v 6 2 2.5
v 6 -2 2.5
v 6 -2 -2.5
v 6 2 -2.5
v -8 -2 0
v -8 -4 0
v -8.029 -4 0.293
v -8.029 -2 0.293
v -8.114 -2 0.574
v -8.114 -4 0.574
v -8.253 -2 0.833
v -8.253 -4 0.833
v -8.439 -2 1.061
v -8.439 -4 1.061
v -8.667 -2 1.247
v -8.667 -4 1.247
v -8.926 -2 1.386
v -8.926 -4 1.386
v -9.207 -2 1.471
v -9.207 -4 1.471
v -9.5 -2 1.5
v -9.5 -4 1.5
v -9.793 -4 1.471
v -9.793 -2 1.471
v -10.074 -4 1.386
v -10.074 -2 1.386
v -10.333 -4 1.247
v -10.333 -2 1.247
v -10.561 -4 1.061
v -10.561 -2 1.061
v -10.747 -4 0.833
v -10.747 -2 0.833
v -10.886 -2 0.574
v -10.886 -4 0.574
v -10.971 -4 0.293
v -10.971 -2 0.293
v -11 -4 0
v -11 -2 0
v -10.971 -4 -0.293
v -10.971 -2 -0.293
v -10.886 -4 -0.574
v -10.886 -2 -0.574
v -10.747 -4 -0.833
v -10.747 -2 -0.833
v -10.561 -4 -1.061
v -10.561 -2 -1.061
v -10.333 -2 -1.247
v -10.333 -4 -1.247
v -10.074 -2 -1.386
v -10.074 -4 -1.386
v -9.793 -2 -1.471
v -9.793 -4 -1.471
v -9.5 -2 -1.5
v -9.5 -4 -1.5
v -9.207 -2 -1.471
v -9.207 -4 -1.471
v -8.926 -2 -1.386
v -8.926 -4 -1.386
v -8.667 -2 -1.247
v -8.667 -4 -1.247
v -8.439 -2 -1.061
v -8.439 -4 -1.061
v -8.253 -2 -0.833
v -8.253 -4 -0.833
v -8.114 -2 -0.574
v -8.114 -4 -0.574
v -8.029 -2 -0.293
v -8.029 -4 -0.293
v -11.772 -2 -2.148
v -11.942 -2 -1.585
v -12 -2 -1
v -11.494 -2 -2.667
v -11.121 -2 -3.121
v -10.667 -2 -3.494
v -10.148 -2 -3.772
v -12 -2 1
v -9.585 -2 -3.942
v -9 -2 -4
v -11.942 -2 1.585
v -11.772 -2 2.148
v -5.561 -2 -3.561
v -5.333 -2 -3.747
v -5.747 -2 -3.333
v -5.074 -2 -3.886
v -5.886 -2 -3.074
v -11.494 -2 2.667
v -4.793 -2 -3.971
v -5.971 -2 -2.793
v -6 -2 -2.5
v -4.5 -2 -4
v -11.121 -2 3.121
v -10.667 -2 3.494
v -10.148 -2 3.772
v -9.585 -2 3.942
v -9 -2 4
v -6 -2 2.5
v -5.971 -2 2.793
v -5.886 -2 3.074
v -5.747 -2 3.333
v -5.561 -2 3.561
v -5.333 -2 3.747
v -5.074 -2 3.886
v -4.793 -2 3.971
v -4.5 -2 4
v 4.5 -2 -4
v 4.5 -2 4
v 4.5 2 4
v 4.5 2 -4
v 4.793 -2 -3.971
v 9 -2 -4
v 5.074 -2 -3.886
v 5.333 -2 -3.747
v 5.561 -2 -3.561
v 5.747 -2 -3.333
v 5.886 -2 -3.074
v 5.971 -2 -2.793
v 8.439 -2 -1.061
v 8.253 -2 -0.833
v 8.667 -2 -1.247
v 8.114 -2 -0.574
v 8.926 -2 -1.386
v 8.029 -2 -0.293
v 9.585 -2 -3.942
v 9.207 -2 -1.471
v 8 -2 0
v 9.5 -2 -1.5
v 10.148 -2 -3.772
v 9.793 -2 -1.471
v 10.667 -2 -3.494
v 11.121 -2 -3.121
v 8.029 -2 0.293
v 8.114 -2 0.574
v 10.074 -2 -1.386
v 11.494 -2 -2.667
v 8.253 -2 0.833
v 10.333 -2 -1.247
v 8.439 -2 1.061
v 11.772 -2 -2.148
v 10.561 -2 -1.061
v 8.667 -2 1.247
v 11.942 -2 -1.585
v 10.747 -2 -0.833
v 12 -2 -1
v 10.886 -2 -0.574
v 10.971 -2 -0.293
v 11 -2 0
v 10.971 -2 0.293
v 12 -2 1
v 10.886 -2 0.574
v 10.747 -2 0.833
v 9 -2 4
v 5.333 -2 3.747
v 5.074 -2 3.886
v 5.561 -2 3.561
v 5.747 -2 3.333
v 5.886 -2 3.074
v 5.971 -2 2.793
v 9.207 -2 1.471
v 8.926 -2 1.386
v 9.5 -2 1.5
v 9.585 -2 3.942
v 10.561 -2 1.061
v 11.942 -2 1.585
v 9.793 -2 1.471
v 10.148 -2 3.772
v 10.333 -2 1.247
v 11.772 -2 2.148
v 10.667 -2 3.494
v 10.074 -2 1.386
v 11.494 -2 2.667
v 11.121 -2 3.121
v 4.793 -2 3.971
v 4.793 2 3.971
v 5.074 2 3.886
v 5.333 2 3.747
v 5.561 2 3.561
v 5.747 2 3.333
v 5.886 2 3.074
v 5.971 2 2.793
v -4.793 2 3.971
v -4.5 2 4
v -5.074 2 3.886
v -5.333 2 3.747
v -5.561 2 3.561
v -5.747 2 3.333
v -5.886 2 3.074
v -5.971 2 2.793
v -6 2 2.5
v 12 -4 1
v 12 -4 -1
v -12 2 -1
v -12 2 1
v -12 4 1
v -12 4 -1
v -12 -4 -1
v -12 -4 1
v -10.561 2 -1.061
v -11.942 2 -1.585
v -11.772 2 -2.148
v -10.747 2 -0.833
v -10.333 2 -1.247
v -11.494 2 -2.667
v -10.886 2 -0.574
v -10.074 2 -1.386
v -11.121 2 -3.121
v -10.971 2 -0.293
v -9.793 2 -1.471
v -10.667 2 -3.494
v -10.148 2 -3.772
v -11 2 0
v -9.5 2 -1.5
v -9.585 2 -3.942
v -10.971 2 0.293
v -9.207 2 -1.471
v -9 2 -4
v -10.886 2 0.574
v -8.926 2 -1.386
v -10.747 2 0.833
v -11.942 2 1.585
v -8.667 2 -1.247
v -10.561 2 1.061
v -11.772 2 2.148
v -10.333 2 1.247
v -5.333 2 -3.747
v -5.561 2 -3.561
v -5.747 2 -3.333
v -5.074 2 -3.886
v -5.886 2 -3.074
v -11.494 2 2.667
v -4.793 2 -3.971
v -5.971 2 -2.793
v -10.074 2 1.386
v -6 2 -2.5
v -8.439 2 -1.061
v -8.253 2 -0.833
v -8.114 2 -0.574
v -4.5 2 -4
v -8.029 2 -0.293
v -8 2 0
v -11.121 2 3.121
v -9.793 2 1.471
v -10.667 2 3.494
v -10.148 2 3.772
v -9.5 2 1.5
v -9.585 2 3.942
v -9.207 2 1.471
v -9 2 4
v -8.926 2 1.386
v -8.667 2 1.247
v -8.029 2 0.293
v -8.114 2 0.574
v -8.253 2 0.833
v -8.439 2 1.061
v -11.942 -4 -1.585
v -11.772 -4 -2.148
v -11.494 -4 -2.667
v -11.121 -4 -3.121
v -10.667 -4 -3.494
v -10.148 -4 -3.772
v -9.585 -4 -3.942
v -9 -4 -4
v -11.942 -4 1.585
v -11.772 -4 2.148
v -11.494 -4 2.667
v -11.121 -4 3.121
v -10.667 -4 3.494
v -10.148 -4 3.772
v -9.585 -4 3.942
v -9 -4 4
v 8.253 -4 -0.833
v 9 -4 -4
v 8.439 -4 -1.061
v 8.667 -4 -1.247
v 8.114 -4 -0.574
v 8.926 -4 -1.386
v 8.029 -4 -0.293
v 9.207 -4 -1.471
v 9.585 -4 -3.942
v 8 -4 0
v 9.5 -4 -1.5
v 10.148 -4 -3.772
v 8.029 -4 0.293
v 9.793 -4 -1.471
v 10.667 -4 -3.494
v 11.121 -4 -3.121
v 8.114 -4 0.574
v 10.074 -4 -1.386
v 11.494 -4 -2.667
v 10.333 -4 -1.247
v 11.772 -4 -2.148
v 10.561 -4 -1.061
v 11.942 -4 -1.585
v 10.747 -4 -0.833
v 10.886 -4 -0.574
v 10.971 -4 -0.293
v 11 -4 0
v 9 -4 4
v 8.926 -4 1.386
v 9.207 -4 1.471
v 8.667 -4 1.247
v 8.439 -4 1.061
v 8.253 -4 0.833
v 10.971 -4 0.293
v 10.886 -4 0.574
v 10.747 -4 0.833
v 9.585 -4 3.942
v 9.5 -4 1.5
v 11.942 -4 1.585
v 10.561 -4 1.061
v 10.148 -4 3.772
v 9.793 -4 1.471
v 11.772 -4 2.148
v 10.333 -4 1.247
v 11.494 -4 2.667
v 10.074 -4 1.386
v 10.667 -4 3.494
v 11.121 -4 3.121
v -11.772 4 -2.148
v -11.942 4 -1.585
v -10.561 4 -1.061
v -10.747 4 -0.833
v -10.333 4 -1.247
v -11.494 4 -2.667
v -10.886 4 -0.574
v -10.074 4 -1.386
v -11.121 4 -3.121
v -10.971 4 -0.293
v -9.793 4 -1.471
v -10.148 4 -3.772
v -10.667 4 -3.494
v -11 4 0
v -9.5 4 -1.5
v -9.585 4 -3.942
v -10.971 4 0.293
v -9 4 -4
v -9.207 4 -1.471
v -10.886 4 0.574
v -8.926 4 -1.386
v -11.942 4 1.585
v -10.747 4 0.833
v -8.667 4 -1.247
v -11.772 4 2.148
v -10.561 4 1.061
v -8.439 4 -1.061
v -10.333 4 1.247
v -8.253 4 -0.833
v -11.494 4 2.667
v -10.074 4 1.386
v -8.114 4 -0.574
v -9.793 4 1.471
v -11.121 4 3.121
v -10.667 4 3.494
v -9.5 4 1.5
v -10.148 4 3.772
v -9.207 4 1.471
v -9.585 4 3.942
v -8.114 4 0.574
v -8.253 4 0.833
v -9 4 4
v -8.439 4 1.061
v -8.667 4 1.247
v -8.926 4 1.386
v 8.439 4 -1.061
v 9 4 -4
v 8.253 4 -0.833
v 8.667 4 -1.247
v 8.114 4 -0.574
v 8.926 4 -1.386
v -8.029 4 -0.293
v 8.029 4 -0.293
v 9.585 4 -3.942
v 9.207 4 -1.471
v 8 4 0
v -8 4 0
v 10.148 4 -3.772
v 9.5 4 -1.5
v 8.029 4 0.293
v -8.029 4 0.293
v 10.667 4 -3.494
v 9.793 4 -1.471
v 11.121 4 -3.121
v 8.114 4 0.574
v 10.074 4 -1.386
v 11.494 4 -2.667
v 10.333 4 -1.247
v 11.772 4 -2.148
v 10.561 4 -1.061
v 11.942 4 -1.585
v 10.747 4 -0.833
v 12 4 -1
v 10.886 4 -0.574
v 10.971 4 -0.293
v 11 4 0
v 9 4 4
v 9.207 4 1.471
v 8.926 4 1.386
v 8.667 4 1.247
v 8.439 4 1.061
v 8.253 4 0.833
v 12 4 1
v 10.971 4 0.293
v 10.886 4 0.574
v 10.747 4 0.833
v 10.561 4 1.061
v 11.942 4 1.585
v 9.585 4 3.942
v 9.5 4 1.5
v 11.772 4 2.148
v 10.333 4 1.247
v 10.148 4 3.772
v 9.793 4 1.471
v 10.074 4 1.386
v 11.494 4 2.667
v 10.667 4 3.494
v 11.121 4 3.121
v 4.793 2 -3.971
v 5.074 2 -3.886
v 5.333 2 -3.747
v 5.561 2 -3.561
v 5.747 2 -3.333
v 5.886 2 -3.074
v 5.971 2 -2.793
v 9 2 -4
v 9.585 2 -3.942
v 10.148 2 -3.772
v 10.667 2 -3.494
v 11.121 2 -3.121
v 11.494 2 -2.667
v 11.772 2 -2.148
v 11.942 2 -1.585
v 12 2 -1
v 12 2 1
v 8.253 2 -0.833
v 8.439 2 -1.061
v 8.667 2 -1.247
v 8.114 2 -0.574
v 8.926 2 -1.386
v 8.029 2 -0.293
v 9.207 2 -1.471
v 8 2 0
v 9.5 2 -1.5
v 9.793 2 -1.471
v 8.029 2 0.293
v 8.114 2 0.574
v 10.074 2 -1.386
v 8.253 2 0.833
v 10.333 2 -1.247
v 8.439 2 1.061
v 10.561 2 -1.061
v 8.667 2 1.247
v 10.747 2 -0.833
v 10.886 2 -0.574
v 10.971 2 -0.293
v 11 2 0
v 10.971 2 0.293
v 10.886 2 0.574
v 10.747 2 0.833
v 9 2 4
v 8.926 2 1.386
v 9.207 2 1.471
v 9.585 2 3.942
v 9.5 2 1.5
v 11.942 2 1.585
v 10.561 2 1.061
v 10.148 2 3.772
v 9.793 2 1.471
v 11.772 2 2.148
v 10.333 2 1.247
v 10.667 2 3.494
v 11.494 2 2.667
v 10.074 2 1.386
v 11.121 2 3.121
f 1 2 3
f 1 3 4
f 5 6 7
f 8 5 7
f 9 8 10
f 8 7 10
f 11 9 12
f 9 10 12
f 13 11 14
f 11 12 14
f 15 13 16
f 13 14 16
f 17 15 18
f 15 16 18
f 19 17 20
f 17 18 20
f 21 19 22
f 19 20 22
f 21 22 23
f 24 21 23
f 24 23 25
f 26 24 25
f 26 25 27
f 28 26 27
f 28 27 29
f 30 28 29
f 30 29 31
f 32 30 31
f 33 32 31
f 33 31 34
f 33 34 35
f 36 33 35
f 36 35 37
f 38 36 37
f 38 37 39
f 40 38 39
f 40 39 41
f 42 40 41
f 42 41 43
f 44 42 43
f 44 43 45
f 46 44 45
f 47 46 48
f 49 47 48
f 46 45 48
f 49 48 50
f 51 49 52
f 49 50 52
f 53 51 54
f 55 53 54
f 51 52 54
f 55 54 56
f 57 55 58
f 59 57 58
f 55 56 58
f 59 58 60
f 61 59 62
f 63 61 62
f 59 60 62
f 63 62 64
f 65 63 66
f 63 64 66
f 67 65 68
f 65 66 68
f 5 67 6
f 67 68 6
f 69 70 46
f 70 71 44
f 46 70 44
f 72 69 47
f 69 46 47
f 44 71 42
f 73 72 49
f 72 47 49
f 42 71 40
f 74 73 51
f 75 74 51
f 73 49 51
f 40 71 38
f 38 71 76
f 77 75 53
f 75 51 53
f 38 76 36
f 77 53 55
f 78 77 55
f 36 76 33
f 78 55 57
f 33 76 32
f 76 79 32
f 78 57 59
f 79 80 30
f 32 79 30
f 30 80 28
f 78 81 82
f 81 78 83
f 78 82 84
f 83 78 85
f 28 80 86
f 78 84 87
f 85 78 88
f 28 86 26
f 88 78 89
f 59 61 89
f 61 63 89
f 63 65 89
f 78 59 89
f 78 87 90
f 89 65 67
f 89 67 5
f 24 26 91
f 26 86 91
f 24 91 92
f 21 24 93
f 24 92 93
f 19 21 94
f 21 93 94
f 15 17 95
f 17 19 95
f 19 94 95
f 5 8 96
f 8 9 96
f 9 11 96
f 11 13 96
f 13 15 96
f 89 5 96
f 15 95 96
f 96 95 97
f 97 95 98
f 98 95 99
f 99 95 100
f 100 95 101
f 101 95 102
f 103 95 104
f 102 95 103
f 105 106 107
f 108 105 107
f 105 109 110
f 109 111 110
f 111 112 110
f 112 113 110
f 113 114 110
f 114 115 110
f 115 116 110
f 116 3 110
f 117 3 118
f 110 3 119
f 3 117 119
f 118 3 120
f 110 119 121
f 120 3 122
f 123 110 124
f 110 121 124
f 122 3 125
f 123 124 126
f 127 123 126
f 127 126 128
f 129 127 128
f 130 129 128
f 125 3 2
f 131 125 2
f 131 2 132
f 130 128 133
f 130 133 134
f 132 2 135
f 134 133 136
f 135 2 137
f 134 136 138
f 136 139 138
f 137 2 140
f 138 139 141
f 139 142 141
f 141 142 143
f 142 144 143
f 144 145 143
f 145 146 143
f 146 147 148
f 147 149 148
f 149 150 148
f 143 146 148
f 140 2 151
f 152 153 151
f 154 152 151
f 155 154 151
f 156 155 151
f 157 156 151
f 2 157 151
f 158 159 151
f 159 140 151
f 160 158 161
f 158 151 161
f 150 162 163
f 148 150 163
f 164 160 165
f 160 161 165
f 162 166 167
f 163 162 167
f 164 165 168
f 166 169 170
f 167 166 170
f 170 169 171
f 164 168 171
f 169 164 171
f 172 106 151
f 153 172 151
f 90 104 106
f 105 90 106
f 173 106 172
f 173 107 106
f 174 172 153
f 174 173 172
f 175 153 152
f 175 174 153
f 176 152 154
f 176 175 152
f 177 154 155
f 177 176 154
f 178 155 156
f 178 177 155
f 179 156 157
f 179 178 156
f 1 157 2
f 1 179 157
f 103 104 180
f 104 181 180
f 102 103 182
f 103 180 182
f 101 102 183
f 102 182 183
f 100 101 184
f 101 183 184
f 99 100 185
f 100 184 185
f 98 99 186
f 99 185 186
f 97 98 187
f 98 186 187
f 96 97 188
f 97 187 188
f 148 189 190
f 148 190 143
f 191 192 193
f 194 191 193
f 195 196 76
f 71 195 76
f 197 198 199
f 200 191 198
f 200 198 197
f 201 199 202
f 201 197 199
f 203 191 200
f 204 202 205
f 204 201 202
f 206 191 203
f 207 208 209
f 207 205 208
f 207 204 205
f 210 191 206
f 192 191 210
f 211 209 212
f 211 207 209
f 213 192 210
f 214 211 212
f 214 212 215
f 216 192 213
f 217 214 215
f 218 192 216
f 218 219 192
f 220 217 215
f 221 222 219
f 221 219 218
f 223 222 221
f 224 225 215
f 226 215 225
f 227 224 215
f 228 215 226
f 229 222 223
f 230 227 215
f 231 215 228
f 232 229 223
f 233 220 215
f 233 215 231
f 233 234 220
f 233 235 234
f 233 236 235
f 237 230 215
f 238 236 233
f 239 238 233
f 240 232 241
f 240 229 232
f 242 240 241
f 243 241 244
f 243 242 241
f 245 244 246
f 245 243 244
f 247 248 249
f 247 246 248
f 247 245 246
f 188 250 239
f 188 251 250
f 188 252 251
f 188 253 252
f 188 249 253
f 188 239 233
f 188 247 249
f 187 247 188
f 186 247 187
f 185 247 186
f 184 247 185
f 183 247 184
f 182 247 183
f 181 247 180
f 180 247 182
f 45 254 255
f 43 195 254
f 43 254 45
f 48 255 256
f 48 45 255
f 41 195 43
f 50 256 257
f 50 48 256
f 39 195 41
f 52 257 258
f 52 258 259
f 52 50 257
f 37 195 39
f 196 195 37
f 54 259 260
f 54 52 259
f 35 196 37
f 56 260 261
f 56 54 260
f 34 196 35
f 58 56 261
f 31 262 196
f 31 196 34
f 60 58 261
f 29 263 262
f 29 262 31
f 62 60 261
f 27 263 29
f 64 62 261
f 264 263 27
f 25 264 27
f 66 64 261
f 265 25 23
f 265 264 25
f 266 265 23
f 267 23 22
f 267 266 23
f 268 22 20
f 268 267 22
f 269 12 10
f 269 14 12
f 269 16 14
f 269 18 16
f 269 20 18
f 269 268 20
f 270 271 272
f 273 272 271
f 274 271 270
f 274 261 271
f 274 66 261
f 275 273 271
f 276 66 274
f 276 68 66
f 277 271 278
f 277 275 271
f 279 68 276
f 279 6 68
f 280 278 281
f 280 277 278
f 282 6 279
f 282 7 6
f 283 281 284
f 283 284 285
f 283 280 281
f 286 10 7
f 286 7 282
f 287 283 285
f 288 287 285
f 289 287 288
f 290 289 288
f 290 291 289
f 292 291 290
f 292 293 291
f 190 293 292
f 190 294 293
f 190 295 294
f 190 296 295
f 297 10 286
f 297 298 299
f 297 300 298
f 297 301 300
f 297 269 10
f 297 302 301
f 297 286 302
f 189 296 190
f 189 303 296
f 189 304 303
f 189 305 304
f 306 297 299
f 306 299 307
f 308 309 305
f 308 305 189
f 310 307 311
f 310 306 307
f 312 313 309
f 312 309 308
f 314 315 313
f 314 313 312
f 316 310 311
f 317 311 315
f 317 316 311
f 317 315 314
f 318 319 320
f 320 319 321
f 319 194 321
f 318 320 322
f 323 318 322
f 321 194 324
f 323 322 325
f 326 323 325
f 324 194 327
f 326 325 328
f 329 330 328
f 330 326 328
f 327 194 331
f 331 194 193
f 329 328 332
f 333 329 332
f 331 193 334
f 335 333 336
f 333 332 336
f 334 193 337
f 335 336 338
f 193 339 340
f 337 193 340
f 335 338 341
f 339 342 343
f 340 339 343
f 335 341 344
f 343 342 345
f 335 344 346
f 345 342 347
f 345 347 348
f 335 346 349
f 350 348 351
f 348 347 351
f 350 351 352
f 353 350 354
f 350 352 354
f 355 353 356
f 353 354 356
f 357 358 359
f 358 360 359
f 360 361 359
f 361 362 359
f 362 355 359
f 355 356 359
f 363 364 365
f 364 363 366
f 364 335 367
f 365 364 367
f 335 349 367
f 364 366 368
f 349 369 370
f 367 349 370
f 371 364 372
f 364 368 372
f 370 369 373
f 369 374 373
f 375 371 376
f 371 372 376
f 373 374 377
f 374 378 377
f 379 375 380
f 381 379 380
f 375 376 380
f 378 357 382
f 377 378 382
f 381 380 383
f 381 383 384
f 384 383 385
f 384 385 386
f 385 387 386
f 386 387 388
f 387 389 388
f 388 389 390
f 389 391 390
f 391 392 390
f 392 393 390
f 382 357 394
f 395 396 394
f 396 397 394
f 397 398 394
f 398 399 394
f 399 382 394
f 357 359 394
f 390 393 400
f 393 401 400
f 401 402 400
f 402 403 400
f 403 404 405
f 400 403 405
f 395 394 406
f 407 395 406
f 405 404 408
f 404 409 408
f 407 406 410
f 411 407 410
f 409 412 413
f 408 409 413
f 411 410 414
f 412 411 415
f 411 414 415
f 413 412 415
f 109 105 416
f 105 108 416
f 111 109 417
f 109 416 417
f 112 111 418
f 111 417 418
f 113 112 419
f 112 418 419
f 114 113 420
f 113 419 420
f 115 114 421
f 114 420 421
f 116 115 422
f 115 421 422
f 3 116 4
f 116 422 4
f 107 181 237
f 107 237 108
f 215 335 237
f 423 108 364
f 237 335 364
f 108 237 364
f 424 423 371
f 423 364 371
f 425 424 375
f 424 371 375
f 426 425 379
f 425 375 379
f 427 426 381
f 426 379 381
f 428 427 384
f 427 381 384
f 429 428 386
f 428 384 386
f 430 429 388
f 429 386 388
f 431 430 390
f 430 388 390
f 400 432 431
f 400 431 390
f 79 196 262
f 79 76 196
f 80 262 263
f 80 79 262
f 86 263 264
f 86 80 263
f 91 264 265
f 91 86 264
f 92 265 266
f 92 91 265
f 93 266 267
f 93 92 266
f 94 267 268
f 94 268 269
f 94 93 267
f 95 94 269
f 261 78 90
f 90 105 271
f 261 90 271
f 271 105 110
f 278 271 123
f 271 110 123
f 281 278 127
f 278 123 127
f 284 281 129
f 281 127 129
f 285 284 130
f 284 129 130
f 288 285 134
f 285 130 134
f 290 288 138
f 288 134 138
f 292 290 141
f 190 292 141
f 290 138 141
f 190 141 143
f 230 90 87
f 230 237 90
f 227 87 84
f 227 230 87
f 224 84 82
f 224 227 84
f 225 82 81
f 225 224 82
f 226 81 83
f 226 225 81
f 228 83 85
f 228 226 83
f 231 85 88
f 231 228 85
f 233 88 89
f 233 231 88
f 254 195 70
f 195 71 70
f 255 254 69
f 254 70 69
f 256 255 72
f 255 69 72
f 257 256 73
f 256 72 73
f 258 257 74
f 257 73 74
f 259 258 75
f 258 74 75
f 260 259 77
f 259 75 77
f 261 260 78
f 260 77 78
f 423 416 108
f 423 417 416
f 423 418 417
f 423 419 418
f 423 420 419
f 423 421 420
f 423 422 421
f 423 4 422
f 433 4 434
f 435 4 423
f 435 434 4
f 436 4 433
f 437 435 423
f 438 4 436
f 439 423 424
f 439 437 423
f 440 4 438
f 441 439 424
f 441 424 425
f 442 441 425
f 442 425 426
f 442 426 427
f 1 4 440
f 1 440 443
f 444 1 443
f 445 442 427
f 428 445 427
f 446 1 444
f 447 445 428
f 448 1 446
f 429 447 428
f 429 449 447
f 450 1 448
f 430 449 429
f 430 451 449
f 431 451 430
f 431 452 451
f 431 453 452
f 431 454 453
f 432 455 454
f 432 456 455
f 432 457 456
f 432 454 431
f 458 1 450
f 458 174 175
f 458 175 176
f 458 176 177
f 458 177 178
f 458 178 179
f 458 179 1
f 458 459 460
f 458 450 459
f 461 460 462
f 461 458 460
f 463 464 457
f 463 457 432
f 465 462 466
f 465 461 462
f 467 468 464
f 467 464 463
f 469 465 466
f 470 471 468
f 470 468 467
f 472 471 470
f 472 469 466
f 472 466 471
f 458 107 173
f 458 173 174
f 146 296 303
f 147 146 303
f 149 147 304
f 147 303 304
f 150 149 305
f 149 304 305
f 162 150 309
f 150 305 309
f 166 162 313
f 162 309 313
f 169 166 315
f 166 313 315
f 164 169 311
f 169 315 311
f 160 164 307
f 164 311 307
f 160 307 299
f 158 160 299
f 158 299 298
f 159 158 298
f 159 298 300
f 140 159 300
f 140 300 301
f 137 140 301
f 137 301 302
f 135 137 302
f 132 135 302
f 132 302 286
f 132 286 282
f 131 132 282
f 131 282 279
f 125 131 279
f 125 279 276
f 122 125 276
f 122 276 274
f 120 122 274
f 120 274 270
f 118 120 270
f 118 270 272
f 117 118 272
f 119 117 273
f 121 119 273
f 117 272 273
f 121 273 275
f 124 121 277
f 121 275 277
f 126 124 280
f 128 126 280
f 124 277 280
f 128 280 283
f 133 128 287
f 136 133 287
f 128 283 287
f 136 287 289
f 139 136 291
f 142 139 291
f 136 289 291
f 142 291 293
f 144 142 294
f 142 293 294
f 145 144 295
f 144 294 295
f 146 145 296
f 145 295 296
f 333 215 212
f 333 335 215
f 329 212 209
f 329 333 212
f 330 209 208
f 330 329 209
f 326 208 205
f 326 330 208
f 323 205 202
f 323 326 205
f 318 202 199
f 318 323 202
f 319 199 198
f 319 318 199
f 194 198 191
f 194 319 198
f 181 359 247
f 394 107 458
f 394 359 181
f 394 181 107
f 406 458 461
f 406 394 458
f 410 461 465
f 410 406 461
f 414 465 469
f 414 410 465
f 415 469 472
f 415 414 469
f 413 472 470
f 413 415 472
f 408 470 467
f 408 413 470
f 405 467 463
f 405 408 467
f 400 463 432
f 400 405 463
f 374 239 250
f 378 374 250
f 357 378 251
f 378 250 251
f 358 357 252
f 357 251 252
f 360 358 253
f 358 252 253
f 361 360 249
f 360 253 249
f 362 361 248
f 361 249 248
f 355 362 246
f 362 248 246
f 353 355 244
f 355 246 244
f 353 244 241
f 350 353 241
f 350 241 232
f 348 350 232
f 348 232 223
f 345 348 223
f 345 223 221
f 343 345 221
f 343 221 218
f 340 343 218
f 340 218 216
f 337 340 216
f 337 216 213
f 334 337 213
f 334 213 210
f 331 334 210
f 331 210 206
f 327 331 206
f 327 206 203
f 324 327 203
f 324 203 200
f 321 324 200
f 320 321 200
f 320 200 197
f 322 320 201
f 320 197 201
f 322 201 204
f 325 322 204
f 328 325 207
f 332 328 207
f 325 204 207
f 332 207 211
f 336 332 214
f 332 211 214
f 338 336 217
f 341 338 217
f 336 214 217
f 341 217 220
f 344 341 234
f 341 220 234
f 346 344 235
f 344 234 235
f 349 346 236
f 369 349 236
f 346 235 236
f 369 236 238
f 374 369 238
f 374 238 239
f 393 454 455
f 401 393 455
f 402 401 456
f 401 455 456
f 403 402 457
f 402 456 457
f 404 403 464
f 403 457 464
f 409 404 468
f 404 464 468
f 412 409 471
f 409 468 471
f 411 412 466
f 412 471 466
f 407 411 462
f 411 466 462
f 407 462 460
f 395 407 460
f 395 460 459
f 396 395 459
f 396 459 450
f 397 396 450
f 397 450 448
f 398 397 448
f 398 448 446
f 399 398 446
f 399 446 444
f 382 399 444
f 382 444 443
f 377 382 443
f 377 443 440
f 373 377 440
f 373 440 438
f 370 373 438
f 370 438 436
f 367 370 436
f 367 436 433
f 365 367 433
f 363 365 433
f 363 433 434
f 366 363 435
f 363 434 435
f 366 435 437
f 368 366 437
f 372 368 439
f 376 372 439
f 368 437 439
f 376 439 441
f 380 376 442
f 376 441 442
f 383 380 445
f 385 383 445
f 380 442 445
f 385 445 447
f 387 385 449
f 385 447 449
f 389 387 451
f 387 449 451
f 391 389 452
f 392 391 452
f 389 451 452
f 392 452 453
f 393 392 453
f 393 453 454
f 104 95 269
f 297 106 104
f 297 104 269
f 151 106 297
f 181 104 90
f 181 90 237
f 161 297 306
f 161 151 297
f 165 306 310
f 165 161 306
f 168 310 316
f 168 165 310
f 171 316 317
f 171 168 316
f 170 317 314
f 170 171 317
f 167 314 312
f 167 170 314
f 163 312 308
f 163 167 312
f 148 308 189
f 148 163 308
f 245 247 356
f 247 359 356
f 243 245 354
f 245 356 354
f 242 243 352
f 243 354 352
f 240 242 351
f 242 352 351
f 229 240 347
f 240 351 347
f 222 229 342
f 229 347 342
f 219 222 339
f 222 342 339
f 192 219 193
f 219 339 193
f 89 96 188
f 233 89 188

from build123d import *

# Parameters (mm, degrees)
F0_W     = 24
F0_H     = 8
F1_DEPTH = 4
F2_W     = 6
F2_H     = 4
F3_DEPTH = 25
F4_R     = 1.5
F5_DEPTH = 25
F6_R     = 3
F7_R     = 1.5
F8_W     = 9
F8_H     = 4
F9_DEPTH = 25


with BuildPart() as f1:
    # F0 (on Top) → F1 (new body, symmetric)
    with BuildSketch(Plane.XY):
        Rectangle(F0_W, F0_H)
    extrude(amount=F1_DEPTH, both=True)

    # F2 (on face) → F3 (cut)
    with BuildSketch(Plane.XY.offset(4)):
        with Locations((-9, 0)):
            Rectangle(F2_W, F2_H)
        with Locations((9, 0)):
            Rectangle(F2_W, F2_H)
    extrude(amount=-F3_DEPTH, mode=Mode.SUBTRACT)

    # F4 (on face) → F5 (cut)
    with BuildSketch(Plane.XZ.offset(4)):
        with Locations((-9.5, 0)):
            Circle(F4_R)
        with Locations((9.5, 0)):
            Circle(F4_R)
    extrude(amount=-F5_DEPTH, mode=Mode.SUBTRACT)

    # F6
    f6_edges = [f1.edges().sort_by_distance(p)[0] for p in [
        (12, -3, 4),
        (12, 3, 4),
        (12, -3, -4),
        (12, 3, -4),
        (-12, -3, 4),
        (-12, 3, 4),
        (-12, -3, -4),
        (-12, 3, -4),
    ]]
    fillet(f6_edges, radius=F6_R)

    # F7
    f7_edges = [f1.edges().sort_by_distance(p)[0] for p in [
        (6, 0, 4),
        (-6, 0, 4),
        (6, 0, -4),
        (-6, 0, -4),
    ]]
    fillet(f7_edges, radius=F7_R)

    # F8 (on face) → F9 (cut)
    with BuildSketch(Plane.XY.offset(4)):
        Rectangle(F8_W, F8_H)
    extrude(amount=-F9_DEPTH, mode=Mode.SUBTRACT)


solid = f1.part
